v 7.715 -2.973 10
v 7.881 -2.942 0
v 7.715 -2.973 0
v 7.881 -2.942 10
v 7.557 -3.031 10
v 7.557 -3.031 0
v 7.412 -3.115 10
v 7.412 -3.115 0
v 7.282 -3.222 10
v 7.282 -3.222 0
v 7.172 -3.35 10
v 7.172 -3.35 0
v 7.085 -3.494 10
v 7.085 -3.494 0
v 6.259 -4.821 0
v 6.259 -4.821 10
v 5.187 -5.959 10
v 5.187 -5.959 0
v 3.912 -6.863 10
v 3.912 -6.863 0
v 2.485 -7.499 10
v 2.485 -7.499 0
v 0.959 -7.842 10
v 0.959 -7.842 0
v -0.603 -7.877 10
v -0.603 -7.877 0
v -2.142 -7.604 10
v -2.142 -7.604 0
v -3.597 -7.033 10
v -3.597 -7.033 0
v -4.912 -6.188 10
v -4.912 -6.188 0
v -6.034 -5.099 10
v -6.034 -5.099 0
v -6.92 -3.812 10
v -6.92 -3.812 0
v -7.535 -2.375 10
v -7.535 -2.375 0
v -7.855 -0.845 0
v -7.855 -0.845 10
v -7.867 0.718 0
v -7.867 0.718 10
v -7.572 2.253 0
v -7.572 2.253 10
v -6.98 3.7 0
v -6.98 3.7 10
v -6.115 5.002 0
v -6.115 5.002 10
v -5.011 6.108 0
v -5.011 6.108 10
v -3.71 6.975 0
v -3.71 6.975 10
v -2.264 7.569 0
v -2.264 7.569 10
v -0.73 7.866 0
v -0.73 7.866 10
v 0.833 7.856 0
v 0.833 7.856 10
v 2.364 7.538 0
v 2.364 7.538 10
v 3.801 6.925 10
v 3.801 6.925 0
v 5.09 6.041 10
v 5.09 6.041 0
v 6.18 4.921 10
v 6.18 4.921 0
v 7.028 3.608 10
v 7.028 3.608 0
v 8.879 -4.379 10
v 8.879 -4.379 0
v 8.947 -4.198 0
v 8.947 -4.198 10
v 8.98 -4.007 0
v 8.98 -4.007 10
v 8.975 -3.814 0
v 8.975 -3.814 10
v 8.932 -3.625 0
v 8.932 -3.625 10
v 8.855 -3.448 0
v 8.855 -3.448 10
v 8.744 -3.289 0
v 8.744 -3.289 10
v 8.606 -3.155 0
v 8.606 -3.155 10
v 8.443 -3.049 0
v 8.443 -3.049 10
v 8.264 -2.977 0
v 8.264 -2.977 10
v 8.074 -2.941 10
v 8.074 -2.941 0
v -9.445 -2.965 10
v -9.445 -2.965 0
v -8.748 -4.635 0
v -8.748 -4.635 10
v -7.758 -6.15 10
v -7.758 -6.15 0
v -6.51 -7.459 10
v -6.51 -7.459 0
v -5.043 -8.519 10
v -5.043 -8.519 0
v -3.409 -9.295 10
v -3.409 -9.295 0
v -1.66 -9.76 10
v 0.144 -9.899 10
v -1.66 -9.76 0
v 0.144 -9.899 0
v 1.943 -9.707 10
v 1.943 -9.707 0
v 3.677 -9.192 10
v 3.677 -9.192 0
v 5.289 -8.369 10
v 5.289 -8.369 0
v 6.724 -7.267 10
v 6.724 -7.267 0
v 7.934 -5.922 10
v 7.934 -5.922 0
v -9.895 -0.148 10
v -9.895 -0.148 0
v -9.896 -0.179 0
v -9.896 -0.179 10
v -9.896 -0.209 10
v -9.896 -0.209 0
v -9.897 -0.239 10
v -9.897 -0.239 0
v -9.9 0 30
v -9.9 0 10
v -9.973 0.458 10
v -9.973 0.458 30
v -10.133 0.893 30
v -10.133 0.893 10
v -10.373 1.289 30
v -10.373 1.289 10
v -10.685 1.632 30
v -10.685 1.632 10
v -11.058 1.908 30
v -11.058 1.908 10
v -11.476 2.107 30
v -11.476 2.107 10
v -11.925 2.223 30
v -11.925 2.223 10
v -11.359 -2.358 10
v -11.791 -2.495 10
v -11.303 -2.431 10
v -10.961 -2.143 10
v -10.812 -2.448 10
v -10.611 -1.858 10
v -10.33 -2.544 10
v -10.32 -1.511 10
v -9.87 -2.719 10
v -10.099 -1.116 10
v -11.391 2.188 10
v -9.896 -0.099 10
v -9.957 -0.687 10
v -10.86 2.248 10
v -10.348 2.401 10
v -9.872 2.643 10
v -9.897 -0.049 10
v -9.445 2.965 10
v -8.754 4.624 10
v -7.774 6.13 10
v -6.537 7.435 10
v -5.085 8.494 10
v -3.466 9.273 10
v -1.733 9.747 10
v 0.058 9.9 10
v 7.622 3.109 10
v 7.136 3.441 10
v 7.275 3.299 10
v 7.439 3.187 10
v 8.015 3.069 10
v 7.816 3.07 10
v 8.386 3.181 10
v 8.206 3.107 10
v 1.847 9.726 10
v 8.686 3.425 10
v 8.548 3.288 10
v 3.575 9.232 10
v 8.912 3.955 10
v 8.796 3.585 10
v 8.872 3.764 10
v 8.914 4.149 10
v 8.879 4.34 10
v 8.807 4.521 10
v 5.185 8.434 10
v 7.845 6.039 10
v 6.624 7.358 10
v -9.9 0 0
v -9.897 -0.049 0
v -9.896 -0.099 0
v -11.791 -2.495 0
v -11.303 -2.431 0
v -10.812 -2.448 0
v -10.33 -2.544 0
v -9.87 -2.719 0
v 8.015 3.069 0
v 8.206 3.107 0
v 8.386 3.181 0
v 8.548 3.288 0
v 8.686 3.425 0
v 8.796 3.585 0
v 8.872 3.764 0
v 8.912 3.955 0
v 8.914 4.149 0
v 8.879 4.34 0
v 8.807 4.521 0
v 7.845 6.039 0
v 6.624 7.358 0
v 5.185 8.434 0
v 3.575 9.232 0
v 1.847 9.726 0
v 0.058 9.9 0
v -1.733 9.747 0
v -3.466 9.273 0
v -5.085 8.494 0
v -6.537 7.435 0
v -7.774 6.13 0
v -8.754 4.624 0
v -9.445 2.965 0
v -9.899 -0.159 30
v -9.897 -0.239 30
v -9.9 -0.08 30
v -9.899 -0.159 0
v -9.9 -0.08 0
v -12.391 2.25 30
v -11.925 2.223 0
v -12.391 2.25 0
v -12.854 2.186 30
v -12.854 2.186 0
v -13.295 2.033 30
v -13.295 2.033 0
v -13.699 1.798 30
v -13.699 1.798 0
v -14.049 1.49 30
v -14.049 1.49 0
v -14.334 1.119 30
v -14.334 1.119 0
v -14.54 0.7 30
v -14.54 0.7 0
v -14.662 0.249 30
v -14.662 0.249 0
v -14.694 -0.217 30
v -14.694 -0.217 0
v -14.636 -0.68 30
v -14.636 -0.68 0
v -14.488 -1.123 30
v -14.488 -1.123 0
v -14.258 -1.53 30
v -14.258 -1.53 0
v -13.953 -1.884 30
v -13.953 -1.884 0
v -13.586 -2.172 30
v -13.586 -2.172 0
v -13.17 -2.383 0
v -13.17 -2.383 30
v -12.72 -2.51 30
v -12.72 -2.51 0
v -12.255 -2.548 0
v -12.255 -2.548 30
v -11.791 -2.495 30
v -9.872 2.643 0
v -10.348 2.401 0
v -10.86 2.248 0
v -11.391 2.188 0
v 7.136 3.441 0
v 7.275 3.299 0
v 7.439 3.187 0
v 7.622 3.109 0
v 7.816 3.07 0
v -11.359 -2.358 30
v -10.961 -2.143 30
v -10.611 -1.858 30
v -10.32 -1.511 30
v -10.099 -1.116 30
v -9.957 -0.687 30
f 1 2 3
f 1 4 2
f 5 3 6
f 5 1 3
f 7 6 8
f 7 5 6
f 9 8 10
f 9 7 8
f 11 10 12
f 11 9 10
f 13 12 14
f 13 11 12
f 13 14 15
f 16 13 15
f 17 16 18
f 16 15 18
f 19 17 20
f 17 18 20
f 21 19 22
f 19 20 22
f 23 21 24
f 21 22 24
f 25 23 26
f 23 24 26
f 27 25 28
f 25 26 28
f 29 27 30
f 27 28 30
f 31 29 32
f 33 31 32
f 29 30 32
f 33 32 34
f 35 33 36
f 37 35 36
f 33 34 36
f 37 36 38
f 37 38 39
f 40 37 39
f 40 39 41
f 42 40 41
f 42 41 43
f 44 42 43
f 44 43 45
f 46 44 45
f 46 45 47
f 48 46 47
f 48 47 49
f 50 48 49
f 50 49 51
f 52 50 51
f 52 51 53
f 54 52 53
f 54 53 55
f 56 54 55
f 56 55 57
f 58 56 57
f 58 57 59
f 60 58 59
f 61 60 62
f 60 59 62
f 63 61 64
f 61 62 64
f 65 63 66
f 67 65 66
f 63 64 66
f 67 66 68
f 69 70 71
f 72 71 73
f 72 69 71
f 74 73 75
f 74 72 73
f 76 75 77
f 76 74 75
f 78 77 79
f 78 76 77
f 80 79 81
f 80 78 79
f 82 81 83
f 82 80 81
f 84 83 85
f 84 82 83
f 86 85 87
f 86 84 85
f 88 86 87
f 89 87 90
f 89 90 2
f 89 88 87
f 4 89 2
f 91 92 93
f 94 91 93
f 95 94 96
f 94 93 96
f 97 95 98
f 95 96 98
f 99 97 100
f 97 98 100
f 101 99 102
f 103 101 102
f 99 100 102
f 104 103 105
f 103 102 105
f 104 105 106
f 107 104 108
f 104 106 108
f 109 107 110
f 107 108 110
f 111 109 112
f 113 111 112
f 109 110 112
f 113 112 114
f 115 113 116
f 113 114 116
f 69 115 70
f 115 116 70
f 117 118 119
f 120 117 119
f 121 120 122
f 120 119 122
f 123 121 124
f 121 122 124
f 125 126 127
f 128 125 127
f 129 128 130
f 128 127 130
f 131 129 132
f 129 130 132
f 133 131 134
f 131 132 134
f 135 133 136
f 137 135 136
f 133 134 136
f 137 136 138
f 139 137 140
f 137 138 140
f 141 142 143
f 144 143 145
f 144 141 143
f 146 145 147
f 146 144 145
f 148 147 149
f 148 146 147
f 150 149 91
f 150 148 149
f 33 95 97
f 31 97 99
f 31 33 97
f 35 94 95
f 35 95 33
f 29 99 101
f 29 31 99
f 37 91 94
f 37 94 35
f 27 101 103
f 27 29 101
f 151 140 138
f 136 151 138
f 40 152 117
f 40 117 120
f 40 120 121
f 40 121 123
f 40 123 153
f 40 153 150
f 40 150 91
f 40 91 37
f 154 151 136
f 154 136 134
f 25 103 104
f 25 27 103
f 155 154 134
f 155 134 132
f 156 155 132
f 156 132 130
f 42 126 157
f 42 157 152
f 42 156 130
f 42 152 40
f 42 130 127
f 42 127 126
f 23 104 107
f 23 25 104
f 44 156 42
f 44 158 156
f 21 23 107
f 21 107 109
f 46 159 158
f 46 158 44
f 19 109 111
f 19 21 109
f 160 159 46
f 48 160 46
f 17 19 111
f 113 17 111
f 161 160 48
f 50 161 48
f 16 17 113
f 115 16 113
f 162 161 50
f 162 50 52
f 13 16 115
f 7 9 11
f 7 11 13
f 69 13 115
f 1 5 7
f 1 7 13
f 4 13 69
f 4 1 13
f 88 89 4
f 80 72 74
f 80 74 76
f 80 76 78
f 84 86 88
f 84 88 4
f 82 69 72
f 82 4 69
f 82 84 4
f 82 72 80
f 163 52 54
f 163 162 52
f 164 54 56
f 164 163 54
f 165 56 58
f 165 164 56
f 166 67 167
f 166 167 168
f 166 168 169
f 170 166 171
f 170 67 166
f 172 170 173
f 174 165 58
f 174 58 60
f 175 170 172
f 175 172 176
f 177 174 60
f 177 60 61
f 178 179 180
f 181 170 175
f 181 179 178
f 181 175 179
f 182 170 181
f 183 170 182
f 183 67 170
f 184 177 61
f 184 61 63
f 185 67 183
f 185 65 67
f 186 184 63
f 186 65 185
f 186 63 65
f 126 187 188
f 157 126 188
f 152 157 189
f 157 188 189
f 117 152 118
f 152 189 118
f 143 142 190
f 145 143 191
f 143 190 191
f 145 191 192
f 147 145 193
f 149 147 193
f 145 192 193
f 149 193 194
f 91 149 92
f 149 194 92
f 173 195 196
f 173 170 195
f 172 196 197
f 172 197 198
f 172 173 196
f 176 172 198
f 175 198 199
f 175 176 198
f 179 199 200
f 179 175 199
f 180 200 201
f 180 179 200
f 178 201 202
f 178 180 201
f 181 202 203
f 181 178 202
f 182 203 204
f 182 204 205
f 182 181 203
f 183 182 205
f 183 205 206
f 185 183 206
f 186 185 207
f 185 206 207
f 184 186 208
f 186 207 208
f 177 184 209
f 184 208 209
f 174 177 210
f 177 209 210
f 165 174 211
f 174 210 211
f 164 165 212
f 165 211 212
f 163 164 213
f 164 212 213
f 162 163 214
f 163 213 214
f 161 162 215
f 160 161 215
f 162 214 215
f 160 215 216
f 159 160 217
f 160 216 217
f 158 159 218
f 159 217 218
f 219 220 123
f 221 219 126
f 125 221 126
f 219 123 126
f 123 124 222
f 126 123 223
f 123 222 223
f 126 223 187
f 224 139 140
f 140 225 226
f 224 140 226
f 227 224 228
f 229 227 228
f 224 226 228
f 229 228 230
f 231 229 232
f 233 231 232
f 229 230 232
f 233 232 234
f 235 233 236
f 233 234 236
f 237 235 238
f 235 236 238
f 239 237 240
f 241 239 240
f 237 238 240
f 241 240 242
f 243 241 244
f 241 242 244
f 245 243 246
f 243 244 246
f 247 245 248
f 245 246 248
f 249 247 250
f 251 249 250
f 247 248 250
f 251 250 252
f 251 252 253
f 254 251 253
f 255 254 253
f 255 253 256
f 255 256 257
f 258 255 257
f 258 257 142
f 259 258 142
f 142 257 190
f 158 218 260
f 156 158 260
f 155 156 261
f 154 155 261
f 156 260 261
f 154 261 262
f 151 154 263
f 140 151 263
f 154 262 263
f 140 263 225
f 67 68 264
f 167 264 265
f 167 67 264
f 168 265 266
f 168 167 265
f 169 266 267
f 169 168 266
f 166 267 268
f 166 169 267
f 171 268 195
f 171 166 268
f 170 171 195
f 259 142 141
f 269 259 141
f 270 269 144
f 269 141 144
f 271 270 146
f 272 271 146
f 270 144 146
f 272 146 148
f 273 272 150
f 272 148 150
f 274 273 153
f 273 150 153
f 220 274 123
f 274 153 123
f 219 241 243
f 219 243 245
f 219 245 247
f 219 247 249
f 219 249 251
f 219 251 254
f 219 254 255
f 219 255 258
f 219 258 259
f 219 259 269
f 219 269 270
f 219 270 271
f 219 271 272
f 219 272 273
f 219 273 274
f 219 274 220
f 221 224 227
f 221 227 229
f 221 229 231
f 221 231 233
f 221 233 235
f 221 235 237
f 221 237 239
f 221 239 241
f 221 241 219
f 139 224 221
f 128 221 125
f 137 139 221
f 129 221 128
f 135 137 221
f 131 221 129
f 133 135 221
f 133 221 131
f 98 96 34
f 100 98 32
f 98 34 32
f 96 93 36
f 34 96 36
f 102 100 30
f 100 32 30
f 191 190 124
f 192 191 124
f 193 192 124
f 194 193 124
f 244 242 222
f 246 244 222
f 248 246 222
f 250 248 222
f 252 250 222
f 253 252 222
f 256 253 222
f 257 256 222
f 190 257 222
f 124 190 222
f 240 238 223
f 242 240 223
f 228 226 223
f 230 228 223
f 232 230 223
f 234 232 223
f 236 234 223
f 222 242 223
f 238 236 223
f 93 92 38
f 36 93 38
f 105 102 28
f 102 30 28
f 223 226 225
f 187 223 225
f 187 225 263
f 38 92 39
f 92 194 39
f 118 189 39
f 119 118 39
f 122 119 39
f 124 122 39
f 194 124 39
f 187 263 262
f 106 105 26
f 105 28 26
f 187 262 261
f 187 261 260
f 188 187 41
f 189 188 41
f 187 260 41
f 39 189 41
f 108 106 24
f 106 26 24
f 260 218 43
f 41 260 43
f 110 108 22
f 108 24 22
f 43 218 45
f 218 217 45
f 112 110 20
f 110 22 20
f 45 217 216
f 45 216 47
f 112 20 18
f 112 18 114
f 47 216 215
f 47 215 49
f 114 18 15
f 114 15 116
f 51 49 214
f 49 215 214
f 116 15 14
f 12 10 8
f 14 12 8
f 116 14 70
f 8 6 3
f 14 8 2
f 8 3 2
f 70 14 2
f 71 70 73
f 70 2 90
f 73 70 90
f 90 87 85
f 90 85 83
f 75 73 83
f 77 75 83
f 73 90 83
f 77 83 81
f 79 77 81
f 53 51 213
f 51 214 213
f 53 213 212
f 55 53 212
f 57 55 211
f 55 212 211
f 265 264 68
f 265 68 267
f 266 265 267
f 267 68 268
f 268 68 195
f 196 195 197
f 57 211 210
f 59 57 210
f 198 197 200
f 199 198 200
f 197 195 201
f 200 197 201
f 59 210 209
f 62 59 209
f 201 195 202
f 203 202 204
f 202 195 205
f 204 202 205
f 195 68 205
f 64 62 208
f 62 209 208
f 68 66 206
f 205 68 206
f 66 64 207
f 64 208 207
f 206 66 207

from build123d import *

# Parameters (mm, degrees)
F1_DEPTH = 10
F2_DEPTH = 30
F3_R     = 0.99999


# Not quite as in the source:
# - a fillet or chamfer is up to 0.001 mm smaller than in the source, because OpenCascade refuses the exact size


with BuildPart() as f1:
    # F0 (on Top) → F1 (new body)
    with BuildSketch(Plane.XY):
        with BuildLine():
            ThreePointArc((-9.4454545455, 2.9653648055), (-9.7857038582, 1.5), (-9.9, 0))
            ThreePointArc((-9.9, 0), (-9.896558825, -0.0741336209), (-9.895411401, -0.1483381952))
            ThreePointArc((-9.895411401, -0.1483381952), (-9.8958382083, -0.193598479), (-9.8971184787, -0.238842665))
            ThreePointArc((-9.8971184787, -0.238842665), (-9.7668963107, -1.6179420433), (-9.4454545455, -2.9653648055))
            ThreePointArc((-9.4454545455, -2.9653648055), (0.0988831148, -9.8995061558), (9.5028042321, -2.7760964907))
            Line((9.5028042321, -2.7760964907), (7.3082145562, -3))
            ThreePointArc((7.3082145562, -3), (-7.9, 0), (7.3082145562, 3))
            Line((7.3082145562, 3), (9.3680287257, 3.2015680213))
            ThreePointArc((9.3680287257, 3.2015680213), (-0.1242846699, 9.8992198339), (-9.4454545455, 2.9653648055))
        make_face()
        with BuildLine():
            ThreePointArc((-9.4454545455, 2.9653648055), (-10.6009515165, 2.3129966374), (-11.9248231248, 2.2228775962))
            ThreePointArc((-11.9248231248, 2.2228775962), (-10.5211552877, 1.4678348291), (-9.9, 0))
            ThreePointArc((-9.9, 0), (-9.7857038582, 1.5), (-9.4454545455, 2.9653648055))
        make_face()
        with BuildLine():
            ThreePointArc((-9.8971184787, -0.238842665), (-10.4571434039, -1.6913128454), (-11.7905485927, -2.4946360333))
            ThreePointArc((-11.7905485927, -2.4946360333), (-10.5690595937, -2.4861794722), (-9.4454545455, -2.9653648055))
            ThreePointArc((-9.4454545455, -2.9653648055), (-9.7668963107, -1.6179420433), (-9.8971184787, -0.238842665))
        make_face()
    extrude(amount=F1_DEPTH)

    # F0 (on Top) → F2 (join)
    with BuildSketch(Plane.XY):
        with BuildLine():
            ThreePointArc((-9.9, 0), (-10.5211552877, 1.4678348291), (-11.9248231248, 2.2228775962))
            ThreePointArc((-11.9248231248, 2.2228775962), (-14.6944398213, -0.2166217115), (-11.7905485927, -2.4946360333))
            ThreePointArc((-11.7905485927, -2.4946360333), (-10.4571434039, -1.6913128454), (-9.8971184787, -0.238842665))
            ThreePointArc((-9.8971184787, -0.238842665), (-9.8992795935, -0.1194300232), (-9.9, 0))
        make_face()
    extrude(amount=F2_DEPTH)

    # F3 (radius 1 in the source; OpenCascade refuses exactly that, so slightly less here)
    f3_edges = [f1.edges().sort_by_distance(p)[0] for p in [
        (9.502804, -2.776096, 5),
        (7.308215, -3, 5),
        (9.368029, 3.201568, 5),
        (7.308215, 3, 5),
    ]]
    fillet(f3_edges, radius=F3_R)


solid = f1.part
